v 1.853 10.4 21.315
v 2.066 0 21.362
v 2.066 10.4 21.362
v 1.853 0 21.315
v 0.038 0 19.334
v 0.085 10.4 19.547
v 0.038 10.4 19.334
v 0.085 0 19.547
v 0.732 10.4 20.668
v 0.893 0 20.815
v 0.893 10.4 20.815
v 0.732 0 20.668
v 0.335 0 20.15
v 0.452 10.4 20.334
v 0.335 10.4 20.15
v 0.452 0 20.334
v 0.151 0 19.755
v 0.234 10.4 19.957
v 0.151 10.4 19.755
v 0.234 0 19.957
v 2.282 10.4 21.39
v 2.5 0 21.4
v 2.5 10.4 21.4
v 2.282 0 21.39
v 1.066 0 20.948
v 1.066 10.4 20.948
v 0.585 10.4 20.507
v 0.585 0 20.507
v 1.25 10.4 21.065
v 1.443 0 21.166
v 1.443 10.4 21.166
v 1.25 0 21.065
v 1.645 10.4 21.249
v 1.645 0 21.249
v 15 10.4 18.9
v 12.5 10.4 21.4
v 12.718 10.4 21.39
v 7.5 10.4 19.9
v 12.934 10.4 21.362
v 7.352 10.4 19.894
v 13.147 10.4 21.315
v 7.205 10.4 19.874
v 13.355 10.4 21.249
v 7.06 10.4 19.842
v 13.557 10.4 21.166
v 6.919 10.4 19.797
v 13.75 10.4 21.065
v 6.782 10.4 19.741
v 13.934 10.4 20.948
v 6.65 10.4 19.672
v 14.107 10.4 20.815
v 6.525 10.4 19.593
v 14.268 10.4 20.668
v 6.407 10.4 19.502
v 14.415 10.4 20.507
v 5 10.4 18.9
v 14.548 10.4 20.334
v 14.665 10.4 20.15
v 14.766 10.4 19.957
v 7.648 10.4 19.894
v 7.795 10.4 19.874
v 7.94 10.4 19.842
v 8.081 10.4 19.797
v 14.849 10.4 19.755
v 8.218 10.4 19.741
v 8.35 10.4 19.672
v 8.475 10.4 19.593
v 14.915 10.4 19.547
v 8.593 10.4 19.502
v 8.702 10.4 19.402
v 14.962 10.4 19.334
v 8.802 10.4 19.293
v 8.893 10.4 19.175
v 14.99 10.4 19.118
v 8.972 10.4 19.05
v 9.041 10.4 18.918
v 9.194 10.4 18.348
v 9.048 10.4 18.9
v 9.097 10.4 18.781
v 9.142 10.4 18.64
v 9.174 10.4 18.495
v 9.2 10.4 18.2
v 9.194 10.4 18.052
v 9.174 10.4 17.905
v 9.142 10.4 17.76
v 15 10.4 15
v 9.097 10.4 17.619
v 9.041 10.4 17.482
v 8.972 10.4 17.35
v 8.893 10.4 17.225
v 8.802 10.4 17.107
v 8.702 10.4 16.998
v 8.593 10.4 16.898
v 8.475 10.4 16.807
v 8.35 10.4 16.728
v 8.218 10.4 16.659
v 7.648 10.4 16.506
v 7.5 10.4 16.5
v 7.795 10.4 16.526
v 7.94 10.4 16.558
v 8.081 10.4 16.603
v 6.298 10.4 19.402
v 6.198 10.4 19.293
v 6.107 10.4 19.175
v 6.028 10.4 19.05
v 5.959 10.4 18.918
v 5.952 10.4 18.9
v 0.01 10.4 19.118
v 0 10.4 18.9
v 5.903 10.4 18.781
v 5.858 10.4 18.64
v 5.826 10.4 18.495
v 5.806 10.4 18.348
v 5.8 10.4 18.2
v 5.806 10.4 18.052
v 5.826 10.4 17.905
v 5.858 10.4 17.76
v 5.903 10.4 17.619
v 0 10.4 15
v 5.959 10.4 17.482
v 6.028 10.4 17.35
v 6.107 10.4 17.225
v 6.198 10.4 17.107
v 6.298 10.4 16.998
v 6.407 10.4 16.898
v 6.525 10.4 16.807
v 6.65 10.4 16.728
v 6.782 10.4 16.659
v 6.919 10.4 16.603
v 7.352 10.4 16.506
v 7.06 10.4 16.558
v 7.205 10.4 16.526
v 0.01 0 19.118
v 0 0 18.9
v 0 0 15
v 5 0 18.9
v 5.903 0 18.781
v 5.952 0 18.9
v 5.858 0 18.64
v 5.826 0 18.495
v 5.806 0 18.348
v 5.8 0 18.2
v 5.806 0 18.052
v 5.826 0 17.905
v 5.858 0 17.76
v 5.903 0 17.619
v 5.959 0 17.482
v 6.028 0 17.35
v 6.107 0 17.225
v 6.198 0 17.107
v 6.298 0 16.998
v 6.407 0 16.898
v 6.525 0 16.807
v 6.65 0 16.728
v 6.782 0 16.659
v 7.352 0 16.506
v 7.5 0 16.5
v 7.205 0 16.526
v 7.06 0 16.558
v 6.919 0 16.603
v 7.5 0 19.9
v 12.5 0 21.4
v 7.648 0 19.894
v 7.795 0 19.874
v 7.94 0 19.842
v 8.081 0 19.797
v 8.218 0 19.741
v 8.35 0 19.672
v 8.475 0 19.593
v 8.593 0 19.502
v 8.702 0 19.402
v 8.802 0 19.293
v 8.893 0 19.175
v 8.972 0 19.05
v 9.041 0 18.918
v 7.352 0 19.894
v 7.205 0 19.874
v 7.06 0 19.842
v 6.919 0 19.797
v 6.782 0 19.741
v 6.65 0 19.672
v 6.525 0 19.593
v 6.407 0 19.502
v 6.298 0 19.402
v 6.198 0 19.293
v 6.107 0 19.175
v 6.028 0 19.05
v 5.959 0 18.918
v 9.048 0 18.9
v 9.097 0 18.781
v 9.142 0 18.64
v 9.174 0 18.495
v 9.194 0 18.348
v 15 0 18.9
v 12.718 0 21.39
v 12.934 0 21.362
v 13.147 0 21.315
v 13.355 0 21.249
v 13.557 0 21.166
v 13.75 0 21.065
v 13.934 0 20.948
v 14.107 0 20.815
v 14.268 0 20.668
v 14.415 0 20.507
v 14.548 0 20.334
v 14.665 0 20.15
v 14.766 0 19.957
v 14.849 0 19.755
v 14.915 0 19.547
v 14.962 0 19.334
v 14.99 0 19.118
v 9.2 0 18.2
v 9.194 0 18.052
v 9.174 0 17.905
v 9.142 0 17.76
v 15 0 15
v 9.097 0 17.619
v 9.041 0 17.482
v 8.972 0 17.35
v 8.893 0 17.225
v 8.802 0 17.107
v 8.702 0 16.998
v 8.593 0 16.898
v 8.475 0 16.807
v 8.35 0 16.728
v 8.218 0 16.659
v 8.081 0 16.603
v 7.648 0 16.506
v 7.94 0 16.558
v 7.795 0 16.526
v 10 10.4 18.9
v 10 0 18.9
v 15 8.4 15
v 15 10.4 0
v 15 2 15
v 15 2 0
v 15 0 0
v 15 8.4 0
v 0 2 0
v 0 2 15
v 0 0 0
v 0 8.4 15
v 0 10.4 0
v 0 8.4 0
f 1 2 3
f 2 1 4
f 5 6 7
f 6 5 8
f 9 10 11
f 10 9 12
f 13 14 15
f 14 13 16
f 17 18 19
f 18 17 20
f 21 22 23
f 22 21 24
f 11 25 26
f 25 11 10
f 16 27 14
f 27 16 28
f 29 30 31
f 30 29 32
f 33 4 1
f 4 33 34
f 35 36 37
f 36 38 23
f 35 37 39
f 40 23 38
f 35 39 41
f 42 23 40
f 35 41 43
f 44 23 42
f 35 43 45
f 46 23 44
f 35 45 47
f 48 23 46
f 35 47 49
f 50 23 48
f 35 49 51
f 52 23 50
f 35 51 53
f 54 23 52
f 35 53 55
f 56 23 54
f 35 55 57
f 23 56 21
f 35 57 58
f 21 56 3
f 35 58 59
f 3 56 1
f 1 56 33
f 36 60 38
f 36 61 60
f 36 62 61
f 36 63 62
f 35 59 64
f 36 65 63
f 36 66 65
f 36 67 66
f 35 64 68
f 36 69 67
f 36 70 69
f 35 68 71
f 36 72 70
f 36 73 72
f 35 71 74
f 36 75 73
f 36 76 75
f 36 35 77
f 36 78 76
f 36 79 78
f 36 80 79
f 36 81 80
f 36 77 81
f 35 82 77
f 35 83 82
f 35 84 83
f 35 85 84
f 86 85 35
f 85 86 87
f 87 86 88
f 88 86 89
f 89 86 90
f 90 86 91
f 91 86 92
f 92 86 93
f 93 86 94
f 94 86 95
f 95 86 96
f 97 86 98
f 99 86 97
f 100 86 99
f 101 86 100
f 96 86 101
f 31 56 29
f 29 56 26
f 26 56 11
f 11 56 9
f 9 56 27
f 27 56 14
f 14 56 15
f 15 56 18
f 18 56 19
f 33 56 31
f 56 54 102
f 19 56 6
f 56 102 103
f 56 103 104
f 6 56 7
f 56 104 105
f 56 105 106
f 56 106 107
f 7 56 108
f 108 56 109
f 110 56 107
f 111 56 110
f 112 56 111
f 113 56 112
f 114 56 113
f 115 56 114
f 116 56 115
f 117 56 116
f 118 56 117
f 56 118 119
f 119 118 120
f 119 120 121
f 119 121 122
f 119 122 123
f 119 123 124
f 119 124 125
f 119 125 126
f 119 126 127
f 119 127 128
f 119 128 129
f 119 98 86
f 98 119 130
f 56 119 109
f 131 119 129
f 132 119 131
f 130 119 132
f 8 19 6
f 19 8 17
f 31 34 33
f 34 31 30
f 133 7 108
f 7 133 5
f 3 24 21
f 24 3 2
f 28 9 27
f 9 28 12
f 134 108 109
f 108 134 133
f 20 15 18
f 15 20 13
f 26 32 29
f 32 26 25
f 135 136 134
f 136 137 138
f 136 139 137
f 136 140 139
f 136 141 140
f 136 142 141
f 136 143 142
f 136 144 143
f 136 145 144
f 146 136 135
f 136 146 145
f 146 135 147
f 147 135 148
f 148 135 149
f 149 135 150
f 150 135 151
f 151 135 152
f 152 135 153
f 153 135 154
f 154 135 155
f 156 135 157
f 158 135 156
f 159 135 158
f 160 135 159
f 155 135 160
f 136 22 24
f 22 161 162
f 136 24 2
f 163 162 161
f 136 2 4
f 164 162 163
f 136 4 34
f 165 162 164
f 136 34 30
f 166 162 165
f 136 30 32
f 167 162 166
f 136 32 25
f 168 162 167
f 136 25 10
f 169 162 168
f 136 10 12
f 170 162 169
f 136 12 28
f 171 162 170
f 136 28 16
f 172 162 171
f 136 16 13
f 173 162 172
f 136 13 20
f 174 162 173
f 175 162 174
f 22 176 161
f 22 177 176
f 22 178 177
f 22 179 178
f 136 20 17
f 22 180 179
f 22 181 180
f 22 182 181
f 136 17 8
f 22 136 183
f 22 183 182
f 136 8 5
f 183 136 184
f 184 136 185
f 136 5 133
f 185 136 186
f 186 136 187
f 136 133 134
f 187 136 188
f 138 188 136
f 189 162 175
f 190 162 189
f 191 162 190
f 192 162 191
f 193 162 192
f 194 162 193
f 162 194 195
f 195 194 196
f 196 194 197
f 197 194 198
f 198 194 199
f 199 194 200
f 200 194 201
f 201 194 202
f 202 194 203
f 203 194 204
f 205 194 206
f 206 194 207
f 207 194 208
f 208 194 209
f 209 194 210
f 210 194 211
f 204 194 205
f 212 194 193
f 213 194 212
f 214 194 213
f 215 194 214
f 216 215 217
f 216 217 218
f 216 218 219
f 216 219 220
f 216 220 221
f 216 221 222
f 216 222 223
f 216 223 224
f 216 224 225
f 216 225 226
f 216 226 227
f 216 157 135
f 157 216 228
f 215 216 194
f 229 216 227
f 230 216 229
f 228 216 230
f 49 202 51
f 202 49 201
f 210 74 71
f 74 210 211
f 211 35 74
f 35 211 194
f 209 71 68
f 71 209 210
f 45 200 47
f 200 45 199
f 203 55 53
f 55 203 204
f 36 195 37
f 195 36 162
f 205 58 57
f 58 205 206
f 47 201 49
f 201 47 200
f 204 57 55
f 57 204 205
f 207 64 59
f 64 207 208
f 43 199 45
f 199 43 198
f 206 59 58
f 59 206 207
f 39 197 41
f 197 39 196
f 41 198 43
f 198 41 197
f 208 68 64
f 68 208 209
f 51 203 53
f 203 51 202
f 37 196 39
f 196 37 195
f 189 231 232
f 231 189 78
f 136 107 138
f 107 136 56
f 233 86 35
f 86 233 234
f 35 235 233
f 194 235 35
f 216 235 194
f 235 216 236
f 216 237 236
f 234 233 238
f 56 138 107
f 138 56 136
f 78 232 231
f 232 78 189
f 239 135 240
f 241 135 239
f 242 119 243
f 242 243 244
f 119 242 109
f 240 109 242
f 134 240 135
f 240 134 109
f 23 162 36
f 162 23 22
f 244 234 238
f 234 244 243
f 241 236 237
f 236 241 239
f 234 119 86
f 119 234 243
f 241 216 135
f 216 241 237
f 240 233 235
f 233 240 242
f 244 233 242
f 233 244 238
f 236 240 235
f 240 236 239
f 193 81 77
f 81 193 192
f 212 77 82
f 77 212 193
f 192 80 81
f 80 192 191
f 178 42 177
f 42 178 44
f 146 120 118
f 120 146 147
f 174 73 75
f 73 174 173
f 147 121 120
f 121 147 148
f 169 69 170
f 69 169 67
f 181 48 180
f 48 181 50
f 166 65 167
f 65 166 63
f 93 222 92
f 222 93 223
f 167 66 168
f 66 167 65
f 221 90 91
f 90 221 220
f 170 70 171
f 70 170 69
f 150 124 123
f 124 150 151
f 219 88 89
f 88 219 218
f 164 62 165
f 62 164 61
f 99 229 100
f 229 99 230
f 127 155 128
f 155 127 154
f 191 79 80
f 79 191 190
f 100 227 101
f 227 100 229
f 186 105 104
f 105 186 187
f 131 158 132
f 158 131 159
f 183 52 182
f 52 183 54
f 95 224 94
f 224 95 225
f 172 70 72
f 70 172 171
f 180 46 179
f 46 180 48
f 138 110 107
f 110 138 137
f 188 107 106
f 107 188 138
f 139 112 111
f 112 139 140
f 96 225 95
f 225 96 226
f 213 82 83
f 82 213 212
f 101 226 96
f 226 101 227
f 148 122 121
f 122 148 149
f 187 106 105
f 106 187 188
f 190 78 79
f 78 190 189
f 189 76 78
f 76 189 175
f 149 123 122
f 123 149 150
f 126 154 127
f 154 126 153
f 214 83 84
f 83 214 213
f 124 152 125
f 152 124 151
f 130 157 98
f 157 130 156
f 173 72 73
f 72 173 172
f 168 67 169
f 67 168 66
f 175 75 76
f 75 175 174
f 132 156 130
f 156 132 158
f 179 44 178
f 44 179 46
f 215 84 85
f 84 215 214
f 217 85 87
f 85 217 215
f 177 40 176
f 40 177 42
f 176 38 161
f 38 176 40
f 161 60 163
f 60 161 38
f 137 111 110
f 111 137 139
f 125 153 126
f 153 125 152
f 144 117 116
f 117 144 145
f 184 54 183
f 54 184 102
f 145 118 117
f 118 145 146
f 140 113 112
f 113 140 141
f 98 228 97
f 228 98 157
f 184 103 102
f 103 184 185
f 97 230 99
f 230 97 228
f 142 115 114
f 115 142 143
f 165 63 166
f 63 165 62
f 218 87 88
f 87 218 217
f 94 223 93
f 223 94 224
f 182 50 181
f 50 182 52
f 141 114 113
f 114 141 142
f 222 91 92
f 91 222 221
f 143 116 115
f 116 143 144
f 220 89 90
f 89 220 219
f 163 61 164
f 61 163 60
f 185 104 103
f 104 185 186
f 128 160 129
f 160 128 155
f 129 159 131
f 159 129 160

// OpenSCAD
/// tunable parameters
frame_depth = 6.4;
tube_od = 3.4;
wall_width = 2.0;
gap = 1.5;
width = 15;
frame_overlap = 15;
radius = 2.5;

// internal parameters
$fa = 5;
$fs = 0.01;
total_depth = wall_width*2 + frame_depth;
top_height = tube_od + gap*2;
    
module block_with_rounded_corners( width, height, depth, radius ) {
    intersection() {
        union() {
                    // bottom of the block             
                    translate([0,-depth,0]) cube([width, depth, height - radius]);
            
                    // create 2 cylinders joined by a slab for the top of the block
                    translate ( [0,0,height - radius] ) {
                        translate( [ radius, 0, 0 ] )
                            rotate( [ 90, 0, 0 ] )
                            cylinder( h=depth, r = radius);
                        translate( [width - radius,0,0] )
                            rotate( [ 90, 0, 0 ] )
                                cylinder( h=depth, r = radius);
                         translate([radius,-depth,0])
                             cube([width - radius*2, depth, radius]);
                     }
             }
             
             // clip off any excess so that if the radius is larger than the height we stay
             // within the block dimensions 
             translate( [0,-depth,0] )
                cube( [ width, depth, height ] );
         }
}

difference() {
    // create bulk of shape
    union() {
        cube( [ width, total_depth, frame_overlap ] );
        translate([0,total_depth,frame_overlap]) 
            block_with_rounded_corners( width, top_height, total_depth, radius );
    }
    
    // subtract slot for attachment to frame
    translate( [ -1, (total_depth - frame_depth)/2, -1 ] )
        cube( [ width + 2, frame_depth, frame_overlap + 1 ] );
    
    // subtract hole for PTFE filament guide tube
    translate( [width/2, total_depth + 1, frame_overlap + gap + tube_od/2] )
      rotate( [ 90, 0, 0 ] )
        cylinder( h=total_depth + 2, d=tube_od );
}
